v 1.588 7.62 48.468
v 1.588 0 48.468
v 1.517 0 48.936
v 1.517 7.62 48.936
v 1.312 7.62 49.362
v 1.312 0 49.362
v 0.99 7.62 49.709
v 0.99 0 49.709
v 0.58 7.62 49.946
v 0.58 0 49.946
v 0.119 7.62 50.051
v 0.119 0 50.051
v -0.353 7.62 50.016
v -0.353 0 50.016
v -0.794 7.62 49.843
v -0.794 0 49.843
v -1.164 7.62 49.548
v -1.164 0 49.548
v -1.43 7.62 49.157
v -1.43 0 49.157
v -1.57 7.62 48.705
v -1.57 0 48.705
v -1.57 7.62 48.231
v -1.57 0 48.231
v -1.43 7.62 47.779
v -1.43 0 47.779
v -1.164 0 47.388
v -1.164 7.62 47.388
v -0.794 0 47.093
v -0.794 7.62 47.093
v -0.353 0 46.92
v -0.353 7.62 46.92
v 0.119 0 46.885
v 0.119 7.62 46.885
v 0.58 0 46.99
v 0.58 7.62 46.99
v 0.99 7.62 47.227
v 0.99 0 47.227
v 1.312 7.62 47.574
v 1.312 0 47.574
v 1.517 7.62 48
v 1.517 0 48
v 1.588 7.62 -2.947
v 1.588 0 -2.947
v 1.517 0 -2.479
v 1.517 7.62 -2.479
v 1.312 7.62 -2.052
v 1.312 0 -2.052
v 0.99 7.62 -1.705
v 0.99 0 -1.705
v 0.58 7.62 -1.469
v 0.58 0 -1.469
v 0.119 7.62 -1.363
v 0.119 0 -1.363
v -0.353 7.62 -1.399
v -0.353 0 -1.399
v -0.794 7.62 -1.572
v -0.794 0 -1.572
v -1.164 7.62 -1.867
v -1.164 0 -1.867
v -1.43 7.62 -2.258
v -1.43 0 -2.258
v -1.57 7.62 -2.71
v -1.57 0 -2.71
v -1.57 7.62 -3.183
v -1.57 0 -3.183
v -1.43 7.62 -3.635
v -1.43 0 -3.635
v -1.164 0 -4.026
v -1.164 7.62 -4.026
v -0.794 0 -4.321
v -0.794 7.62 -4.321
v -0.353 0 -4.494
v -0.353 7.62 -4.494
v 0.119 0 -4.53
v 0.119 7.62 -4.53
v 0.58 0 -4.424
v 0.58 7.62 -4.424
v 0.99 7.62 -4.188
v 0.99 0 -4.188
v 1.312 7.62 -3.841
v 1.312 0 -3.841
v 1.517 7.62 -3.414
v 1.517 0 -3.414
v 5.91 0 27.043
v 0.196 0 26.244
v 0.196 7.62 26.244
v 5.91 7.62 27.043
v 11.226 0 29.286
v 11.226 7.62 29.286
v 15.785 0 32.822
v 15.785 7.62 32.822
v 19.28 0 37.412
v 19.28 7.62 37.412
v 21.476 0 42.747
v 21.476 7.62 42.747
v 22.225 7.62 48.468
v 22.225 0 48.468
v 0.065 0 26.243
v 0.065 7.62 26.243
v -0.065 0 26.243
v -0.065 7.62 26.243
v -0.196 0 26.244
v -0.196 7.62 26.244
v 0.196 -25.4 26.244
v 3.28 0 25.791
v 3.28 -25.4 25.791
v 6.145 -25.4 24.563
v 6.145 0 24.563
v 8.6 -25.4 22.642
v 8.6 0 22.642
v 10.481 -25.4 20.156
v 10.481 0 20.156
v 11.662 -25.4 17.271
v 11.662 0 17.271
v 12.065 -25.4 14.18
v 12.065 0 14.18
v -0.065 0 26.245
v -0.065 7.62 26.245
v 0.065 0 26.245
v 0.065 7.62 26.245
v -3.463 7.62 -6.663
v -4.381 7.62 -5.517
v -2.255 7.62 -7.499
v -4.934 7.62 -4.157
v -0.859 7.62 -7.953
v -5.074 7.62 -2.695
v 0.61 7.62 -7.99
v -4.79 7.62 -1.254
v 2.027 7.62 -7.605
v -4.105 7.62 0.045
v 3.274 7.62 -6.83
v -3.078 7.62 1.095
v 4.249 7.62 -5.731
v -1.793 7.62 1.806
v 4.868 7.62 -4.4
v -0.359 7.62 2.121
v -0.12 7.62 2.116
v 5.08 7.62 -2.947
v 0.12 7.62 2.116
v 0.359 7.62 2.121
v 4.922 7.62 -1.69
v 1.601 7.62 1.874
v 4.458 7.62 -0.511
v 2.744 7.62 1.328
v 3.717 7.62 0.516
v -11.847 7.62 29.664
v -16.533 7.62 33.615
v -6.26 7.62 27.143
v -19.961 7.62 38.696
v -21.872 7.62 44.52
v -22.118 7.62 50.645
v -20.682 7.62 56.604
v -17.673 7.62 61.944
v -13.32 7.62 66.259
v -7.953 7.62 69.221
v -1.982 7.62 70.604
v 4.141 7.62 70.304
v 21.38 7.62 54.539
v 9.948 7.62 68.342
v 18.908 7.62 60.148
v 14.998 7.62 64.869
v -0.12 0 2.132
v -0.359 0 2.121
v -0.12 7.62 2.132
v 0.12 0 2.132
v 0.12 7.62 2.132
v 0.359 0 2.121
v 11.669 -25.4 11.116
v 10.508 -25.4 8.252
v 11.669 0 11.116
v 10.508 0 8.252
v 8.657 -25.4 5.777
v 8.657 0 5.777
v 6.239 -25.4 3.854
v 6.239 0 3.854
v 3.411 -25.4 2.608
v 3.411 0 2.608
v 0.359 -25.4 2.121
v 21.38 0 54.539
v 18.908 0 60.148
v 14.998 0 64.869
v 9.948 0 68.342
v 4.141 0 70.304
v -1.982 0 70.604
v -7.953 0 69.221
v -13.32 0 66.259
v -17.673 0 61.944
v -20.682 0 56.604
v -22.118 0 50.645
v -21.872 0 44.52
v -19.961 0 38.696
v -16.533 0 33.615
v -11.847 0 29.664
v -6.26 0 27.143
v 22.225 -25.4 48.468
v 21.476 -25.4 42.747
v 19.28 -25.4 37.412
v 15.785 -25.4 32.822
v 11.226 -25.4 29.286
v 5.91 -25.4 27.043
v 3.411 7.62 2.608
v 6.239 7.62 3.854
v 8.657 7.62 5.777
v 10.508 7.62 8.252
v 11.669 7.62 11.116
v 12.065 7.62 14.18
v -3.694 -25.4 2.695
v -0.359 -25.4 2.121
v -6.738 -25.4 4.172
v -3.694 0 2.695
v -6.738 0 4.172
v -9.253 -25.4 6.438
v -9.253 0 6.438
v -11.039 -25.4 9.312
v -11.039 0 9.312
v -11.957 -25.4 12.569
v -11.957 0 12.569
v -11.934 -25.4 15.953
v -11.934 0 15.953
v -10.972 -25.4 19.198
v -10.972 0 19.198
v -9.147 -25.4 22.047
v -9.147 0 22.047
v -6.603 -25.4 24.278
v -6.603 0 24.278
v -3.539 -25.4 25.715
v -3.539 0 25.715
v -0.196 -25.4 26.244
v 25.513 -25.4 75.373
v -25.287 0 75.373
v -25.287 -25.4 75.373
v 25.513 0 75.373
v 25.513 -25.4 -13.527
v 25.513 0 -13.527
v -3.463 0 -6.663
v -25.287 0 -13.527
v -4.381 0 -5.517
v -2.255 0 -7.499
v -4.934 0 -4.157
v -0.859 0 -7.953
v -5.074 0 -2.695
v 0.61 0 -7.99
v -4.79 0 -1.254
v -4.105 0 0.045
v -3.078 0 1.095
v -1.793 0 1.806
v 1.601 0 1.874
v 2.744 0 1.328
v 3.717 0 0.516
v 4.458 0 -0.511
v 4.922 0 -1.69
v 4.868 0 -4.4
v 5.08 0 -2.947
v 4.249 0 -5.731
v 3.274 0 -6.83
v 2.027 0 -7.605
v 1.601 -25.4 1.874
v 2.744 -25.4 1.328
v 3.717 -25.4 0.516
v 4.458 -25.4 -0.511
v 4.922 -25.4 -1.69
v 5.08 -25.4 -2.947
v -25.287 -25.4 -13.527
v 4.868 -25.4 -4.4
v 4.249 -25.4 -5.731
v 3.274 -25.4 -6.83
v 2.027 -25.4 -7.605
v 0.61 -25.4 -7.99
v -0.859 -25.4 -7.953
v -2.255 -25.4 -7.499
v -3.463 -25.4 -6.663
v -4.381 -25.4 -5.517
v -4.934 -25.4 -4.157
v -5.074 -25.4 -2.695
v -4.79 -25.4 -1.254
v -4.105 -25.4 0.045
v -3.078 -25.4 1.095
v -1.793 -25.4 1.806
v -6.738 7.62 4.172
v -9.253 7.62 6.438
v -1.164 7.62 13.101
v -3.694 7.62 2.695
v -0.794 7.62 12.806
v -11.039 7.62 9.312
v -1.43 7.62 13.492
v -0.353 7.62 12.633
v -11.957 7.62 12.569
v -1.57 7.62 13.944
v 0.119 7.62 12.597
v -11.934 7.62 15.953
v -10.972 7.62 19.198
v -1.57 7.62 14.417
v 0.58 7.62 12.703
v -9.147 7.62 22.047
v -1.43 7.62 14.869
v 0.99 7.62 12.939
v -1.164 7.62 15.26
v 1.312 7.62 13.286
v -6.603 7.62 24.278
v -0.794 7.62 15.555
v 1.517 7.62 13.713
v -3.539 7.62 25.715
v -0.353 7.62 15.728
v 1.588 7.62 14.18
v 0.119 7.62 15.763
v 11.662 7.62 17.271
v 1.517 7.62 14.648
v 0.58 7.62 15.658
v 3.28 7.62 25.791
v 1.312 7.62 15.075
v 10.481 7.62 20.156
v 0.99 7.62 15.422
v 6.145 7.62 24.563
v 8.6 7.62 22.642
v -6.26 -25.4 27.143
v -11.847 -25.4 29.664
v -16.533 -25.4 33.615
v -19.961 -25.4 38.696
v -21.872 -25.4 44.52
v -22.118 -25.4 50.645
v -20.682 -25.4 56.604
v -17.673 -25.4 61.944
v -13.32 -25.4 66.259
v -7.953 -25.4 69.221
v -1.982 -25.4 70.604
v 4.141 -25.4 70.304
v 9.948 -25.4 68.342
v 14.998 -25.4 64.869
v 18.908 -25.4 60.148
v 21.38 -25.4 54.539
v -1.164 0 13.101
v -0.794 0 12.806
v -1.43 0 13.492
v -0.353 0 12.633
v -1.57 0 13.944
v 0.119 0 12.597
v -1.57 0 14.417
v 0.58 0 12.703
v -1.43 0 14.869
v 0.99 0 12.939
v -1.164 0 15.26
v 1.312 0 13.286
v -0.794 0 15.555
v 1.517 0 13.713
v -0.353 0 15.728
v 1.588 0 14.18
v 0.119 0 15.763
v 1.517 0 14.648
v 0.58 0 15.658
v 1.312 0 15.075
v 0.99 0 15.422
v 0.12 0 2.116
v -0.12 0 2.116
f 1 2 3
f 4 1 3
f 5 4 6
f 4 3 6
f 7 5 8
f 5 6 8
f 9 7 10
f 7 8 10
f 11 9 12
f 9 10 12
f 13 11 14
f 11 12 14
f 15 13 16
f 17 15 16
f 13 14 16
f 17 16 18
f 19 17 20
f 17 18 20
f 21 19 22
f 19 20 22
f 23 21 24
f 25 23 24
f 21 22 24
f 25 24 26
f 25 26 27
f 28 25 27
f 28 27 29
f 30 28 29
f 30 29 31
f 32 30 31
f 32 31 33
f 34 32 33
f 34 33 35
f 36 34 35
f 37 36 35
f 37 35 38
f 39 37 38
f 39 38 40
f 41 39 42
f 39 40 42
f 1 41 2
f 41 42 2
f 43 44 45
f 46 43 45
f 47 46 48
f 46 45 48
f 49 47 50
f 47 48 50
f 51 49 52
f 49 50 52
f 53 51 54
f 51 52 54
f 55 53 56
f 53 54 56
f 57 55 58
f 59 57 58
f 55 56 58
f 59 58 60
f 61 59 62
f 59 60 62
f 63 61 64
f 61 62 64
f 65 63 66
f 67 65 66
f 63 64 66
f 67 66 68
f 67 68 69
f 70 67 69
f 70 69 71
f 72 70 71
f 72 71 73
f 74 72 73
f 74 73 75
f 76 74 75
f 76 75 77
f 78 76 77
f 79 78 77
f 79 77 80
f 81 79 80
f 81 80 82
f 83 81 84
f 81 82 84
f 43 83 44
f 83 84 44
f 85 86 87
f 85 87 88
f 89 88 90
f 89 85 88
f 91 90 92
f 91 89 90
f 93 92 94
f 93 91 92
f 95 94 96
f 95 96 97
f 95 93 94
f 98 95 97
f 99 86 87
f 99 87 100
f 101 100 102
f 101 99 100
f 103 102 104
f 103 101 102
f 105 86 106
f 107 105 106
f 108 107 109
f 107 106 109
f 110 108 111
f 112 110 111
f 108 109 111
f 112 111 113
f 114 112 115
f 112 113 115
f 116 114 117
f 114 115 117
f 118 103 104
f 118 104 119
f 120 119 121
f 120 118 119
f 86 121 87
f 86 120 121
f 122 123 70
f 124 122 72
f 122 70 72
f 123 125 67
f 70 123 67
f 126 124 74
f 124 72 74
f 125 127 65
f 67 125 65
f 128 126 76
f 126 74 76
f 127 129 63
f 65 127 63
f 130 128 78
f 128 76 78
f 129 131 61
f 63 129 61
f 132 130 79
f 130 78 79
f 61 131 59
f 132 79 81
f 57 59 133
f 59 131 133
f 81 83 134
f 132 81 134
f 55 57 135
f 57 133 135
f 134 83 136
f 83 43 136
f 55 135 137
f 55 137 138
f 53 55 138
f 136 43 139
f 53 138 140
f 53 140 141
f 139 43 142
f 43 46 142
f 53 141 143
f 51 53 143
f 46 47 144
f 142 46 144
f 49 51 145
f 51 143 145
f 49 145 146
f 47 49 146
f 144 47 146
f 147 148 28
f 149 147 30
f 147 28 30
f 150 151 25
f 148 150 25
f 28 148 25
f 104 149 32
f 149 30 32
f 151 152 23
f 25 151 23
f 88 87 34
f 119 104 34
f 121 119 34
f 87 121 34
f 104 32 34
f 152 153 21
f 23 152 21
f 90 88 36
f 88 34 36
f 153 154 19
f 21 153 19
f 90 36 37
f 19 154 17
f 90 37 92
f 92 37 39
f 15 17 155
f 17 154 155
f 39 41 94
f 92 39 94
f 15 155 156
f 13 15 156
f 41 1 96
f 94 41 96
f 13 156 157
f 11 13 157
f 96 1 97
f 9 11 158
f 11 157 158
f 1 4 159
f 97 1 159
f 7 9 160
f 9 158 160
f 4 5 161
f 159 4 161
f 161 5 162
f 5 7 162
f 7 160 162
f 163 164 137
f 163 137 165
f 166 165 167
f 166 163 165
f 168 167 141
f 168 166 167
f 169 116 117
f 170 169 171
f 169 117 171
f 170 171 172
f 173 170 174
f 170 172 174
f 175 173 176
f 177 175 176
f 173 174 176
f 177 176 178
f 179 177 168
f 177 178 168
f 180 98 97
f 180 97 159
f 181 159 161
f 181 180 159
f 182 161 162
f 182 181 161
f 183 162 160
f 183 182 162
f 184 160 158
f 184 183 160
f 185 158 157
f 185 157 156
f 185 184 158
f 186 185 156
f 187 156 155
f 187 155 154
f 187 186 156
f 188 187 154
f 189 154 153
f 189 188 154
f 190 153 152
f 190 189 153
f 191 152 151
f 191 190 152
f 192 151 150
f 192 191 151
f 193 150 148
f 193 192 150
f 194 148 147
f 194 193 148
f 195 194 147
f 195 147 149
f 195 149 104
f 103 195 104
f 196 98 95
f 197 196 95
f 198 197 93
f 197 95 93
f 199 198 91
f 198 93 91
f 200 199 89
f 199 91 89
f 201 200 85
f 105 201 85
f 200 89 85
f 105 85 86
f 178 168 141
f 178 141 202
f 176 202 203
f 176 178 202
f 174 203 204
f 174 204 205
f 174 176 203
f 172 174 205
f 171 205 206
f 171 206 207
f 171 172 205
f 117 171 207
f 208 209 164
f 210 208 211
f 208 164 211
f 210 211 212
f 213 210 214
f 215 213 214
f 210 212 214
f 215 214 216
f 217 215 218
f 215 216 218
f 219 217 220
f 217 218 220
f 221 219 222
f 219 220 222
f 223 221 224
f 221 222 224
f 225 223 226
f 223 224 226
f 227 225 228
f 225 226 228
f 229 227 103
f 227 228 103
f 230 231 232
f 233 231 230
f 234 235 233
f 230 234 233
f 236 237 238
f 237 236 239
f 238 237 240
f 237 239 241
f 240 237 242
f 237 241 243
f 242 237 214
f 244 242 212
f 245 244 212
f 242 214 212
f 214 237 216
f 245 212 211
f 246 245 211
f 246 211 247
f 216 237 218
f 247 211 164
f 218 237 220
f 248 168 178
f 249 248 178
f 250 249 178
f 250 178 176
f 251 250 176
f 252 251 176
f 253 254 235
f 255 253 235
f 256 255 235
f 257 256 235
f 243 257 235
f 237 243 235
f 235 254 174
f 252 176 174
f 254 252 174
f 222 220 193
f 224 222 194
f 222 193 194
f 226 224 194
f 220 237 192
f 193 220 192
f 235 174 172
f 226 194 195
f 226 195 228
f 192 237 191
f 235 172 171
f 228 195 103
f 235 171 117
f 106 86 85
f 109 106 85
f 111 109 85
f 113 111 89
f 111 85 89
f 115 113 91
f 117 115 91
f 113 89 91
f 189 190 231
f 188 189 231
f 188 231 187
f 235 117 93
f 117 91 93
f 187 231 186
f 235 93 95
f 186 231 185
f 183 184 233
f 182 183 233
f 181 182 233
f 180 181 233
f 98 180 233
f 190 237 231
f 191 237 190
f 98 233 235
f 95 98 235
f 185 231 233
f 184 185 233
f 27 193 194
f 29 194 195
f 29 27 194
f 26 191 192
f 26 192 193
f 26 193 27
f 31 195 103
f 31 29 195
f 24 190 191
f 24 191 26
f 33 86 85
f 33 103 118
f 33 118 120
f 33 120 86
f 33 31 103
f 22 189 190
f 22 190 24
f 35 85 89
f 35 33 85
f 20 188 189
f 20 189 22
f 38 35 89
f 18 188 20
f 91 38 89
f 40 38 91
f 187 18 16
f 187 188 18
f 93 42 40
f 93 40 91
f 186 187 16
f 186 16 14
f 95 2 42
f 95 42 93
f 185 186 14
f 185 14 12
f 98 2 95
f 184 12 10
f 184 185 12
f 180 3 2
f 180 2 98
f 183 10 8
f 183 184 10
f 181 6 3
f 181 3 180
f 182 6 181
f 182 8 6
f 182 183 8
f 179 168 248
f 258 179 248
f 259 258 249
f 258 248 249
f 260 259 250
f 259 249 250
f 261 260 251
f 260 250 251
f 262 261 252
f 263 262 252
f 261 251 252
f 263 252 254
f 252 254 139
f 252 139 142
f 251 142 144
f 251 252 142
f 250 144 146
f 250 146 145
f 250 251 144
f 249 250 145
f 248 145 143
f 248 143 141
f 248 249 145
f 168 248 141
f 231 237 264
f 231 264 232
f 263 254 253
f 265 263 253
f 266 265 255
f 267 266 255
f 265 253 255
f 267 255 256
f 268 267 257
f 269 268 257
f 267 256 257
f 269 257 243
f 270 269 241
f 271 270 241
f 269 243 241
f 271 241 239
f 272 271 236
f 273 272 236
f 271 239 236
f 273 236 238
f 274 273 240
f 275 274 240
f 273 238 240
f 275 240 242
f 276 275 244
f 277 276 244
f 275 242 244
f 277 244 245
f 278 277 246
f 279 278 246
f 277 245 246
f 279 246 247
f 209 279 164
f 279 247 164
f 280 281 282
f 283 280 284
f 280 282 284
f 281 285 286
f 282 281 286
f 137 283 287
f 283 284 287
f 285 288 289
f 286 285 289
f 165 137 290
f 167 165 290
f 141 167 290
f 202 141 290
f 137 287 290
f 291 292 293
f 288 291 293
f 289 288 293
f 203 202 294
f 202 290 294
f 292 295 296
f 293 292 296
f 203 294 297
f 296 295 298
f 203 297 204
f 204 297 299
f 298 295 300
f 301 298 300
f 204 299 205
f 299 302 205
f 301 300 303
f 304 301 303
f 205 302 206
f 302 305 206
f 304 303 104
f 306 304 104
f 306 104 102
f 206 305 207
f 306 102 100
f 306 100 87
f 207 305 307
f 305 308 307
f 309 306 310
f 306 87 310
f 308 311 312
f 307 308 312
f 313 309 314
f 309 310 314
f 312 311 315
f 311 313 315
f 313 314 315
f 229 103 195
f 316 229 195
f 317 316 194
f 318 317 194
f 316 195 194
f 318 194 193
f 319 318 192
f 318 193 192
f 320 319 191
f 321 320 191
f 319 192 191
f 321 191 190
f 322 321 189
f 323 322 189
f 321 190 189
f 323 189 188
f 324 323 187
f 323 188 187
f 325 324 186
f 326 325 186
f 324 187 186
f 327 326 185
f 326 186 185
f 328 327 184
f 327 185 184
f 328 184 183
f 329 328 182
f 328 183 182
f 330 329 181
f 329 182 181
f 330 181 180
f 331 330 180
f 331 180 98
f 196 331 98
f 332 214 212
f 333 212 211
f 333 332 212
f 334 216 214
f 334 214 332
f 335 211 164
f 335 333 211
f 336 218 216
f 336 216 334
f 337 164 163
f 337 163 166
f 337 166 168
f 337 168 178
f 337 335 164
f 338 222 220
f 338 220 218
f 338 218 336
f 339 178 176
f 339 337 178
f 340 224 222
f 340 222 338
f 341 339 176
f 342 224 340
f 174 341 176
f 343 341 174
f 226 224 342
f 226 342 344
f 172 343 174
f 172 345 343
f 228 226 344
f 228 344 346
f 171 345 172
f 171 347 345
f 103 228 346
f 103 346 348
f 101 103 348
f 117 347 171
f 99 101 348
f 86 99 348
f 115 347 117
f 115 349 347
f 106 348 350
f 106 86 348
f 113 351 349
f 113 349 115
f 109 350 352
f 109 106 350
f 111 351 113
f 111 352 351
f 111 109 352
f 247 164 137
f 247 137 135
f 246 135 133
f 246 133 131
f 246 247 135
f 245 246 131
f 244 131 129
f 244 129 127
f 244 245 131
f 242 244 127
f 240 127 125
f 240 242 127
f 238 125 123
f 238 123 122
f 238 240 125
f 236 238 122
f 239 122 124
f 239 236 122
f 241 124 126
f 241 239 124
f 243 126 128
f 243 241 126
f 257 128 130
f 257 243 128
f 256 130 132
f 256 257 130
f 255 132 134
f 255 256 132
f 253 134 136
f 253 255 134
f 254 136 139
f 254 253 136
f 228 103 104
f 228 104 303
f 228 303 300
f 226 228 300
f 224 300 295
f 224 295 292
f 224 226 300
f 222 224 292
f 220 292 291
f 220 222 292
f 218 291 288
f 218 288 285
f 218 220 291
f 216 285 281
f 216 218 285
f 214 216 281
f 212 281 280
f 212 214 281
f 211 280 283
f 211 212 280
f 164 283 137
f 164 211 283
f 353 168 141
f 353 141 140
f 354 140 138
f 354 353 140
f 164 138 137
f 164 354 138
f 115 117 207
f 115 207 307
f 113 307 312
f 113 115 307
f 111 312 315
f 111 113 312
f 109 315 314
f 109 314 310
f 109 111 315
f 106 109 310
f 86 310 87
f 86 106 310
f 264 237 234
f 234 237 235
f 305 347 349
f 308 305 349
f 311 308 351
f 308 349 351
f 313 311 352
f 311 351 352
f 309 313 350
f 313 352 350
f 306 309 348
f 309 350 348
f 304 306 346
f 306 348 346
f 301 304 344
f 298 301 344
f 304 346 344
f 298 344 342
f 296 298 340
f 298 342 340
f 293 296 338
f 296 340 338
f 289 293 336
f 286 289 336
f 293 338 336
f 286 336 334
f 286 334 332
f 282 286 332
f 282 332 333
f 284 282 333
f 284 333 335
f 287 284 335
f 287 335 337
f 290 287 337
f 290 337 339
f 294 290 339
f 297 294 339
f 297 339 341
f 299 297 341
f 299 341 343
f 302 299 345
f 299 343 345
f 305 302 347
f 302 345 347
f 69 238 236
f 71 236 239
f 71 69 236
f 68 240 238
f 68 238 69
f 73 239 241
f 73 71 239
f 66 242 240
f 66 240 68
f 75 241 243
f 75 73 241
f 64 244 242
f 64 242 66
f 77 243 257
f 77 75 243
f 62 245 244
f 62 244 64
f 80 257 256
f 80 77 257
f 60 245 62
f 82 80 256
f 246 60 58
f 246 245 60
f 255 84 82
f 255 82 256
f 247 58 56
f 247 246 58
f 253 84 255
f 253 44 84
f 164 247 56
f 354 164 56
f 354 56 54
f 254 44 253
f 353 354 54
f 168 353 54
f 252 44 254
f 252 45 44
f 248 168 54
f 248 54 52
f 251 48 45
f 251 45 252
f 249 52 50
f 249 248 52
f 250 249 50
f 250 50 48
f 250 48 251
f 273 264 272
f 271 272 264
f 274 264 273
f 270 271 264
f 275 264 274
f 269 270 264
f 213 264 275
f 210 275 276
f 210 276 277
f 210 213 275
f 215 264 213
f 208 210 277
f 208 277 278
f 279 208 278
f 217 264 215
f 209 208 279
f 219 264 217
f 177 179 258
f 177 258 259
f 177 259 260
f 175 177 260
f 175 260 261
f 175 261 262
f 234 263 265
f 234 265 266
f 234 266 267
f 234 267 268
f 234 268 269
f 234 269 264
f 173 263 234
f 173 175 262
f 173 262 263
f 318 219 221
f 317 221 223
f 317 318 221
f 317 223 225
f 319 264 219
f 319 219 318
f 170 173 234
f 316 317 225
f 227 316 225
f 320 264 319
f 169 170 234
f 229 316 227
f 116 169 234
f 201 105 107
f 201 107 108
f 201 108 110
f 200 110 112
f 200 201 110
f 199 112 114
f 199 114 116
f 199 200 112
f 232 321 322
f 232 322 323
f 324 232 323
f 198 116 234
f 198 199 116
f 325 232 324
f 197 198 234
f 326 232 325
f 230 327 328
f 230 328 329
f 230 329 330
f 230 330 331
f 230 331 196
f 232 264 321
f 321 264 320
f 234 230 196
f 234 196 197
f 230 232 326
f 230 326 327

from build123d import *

# Parameters (mm, degrees)
F0_W     = 50.8
F0_H     = 88.9
F1_DEPTH = 25.4
F0_R     = 1.5875
F2_DEPTH = 7.62
F3_DEPTH = 7.62
F4_DEPTH = 7.62


with BuildPart() as f1:
    # F0 (on Front) → F1 (new body)
    with BuildSketch(Plane.XZ):
        with Locations((0.113329, 30.922893)):
            Rectangle(F0_W, F0_H)
        with BuildLine():
            ThreePointArc((-0.196195, 26.243829), (-15.645929, 64.252624), (22.225, 48.467963))
            ThreePointArc((22.225, 48.467963), (15.784661, 32.822033), (0.196195, 26.243829))
            ThreePointArc((0.196195, 26.243829), (8.600329, 22.642018), (12.065, 14.180424))
            ThreePointArc((12.065, 14.180424), (8.6572, 5.777025), (0.358889, 2.120763))
            ThreePointArc((0.358889, 2.120763), (3.716824, 0.516348), (5.08, -2.946544))
            ThreePointArc((5.08, -2.946544), (-3.462892, -6.663368), (-0.358889, 2.120763))
            ThreePointArc((-0.358889, 2.120763), (-12.064726, 14.261793), (-0.196195, 26.243829))
        make_face(mode=Mode.SUBTRACT)
    extrude(amount=F1_DEPTH)


with BuildPart() as f2:
    # F0 (on Front) → F2 (new body)
    with BuildSketch(Plane.XZ):
        with BuildLine():
            ThreePointArc((0.196195, 26.243829), (15.784661, 32.822033), (22.225, 48.467963))
            ThreePointArc((22.225, 48.467963), (-15.645929, 64.252624), (-0.196195, 26.243829))
            ThreePointArc((-0.196195, 26.243829), (0, 26.245424), (0.196195, 26.243829))
        make_face()
        with Locations((0, 48.467963)):
            Circle(F0_R, mode=Mode.SUBTRACT)
    extrude(amount=-F2_DEPTH)


with BuildPart() as f3:
    # F0 (on Front) → F3 (new body)
    with BuildSketch(Plane.XZ):
        with BuildLine():
            ThreePointArc((0.196195, 26.243829), (0, 26.242963), (-0.196195, 26.243829))
            ThreePointArc((-0.196195, 26.243829), (-12.064726, 14.261793), (-0.358889, 2.120763))
            ThreePointArc((-0.358889, 2.120763), (0, 2.133456), (0.358889, 2.120763))
            ThreePointArc((0.358889, 2.120763), (8.6572, 5.777025), (12.065, 14.180424))
            ThreePointArc((12.065, 14.180424), (8.600329, 22.642018), (0.196195, 26.243829))
        make_face()
        with Locations((0, 14.180424)):
            Circle(F0_R, mode=Mode.SUBTRACT)
    extrude(amount=-F3_DEPTH)


with BuildPart() as f4:
    # F0 (on Front) → F4 (new body)
    with BuildSketch(Plane.XZ):
        with BuildLine():
            ThreePointArc((0.358889, 2.120763), (0, 2.115424), (-0.358889, 2.120763))
            ThreePointArc((-0.358889, 2.120763), (-3.462892, -6.663368), (5.08, -2.946544))
            ThreePointArc((5.08, -2.946544), (3.716824, 0.516348), (0.358889, 2.120763))
        make_face()
        with Locations((0, -2.946544)):
            Circle(F0_R, mode=Mode.SUBTRACT)
    extrude(amount=-F4_DEPTH)


solid = Compound([f1.part, f2.part, f3.part, f4.part])
